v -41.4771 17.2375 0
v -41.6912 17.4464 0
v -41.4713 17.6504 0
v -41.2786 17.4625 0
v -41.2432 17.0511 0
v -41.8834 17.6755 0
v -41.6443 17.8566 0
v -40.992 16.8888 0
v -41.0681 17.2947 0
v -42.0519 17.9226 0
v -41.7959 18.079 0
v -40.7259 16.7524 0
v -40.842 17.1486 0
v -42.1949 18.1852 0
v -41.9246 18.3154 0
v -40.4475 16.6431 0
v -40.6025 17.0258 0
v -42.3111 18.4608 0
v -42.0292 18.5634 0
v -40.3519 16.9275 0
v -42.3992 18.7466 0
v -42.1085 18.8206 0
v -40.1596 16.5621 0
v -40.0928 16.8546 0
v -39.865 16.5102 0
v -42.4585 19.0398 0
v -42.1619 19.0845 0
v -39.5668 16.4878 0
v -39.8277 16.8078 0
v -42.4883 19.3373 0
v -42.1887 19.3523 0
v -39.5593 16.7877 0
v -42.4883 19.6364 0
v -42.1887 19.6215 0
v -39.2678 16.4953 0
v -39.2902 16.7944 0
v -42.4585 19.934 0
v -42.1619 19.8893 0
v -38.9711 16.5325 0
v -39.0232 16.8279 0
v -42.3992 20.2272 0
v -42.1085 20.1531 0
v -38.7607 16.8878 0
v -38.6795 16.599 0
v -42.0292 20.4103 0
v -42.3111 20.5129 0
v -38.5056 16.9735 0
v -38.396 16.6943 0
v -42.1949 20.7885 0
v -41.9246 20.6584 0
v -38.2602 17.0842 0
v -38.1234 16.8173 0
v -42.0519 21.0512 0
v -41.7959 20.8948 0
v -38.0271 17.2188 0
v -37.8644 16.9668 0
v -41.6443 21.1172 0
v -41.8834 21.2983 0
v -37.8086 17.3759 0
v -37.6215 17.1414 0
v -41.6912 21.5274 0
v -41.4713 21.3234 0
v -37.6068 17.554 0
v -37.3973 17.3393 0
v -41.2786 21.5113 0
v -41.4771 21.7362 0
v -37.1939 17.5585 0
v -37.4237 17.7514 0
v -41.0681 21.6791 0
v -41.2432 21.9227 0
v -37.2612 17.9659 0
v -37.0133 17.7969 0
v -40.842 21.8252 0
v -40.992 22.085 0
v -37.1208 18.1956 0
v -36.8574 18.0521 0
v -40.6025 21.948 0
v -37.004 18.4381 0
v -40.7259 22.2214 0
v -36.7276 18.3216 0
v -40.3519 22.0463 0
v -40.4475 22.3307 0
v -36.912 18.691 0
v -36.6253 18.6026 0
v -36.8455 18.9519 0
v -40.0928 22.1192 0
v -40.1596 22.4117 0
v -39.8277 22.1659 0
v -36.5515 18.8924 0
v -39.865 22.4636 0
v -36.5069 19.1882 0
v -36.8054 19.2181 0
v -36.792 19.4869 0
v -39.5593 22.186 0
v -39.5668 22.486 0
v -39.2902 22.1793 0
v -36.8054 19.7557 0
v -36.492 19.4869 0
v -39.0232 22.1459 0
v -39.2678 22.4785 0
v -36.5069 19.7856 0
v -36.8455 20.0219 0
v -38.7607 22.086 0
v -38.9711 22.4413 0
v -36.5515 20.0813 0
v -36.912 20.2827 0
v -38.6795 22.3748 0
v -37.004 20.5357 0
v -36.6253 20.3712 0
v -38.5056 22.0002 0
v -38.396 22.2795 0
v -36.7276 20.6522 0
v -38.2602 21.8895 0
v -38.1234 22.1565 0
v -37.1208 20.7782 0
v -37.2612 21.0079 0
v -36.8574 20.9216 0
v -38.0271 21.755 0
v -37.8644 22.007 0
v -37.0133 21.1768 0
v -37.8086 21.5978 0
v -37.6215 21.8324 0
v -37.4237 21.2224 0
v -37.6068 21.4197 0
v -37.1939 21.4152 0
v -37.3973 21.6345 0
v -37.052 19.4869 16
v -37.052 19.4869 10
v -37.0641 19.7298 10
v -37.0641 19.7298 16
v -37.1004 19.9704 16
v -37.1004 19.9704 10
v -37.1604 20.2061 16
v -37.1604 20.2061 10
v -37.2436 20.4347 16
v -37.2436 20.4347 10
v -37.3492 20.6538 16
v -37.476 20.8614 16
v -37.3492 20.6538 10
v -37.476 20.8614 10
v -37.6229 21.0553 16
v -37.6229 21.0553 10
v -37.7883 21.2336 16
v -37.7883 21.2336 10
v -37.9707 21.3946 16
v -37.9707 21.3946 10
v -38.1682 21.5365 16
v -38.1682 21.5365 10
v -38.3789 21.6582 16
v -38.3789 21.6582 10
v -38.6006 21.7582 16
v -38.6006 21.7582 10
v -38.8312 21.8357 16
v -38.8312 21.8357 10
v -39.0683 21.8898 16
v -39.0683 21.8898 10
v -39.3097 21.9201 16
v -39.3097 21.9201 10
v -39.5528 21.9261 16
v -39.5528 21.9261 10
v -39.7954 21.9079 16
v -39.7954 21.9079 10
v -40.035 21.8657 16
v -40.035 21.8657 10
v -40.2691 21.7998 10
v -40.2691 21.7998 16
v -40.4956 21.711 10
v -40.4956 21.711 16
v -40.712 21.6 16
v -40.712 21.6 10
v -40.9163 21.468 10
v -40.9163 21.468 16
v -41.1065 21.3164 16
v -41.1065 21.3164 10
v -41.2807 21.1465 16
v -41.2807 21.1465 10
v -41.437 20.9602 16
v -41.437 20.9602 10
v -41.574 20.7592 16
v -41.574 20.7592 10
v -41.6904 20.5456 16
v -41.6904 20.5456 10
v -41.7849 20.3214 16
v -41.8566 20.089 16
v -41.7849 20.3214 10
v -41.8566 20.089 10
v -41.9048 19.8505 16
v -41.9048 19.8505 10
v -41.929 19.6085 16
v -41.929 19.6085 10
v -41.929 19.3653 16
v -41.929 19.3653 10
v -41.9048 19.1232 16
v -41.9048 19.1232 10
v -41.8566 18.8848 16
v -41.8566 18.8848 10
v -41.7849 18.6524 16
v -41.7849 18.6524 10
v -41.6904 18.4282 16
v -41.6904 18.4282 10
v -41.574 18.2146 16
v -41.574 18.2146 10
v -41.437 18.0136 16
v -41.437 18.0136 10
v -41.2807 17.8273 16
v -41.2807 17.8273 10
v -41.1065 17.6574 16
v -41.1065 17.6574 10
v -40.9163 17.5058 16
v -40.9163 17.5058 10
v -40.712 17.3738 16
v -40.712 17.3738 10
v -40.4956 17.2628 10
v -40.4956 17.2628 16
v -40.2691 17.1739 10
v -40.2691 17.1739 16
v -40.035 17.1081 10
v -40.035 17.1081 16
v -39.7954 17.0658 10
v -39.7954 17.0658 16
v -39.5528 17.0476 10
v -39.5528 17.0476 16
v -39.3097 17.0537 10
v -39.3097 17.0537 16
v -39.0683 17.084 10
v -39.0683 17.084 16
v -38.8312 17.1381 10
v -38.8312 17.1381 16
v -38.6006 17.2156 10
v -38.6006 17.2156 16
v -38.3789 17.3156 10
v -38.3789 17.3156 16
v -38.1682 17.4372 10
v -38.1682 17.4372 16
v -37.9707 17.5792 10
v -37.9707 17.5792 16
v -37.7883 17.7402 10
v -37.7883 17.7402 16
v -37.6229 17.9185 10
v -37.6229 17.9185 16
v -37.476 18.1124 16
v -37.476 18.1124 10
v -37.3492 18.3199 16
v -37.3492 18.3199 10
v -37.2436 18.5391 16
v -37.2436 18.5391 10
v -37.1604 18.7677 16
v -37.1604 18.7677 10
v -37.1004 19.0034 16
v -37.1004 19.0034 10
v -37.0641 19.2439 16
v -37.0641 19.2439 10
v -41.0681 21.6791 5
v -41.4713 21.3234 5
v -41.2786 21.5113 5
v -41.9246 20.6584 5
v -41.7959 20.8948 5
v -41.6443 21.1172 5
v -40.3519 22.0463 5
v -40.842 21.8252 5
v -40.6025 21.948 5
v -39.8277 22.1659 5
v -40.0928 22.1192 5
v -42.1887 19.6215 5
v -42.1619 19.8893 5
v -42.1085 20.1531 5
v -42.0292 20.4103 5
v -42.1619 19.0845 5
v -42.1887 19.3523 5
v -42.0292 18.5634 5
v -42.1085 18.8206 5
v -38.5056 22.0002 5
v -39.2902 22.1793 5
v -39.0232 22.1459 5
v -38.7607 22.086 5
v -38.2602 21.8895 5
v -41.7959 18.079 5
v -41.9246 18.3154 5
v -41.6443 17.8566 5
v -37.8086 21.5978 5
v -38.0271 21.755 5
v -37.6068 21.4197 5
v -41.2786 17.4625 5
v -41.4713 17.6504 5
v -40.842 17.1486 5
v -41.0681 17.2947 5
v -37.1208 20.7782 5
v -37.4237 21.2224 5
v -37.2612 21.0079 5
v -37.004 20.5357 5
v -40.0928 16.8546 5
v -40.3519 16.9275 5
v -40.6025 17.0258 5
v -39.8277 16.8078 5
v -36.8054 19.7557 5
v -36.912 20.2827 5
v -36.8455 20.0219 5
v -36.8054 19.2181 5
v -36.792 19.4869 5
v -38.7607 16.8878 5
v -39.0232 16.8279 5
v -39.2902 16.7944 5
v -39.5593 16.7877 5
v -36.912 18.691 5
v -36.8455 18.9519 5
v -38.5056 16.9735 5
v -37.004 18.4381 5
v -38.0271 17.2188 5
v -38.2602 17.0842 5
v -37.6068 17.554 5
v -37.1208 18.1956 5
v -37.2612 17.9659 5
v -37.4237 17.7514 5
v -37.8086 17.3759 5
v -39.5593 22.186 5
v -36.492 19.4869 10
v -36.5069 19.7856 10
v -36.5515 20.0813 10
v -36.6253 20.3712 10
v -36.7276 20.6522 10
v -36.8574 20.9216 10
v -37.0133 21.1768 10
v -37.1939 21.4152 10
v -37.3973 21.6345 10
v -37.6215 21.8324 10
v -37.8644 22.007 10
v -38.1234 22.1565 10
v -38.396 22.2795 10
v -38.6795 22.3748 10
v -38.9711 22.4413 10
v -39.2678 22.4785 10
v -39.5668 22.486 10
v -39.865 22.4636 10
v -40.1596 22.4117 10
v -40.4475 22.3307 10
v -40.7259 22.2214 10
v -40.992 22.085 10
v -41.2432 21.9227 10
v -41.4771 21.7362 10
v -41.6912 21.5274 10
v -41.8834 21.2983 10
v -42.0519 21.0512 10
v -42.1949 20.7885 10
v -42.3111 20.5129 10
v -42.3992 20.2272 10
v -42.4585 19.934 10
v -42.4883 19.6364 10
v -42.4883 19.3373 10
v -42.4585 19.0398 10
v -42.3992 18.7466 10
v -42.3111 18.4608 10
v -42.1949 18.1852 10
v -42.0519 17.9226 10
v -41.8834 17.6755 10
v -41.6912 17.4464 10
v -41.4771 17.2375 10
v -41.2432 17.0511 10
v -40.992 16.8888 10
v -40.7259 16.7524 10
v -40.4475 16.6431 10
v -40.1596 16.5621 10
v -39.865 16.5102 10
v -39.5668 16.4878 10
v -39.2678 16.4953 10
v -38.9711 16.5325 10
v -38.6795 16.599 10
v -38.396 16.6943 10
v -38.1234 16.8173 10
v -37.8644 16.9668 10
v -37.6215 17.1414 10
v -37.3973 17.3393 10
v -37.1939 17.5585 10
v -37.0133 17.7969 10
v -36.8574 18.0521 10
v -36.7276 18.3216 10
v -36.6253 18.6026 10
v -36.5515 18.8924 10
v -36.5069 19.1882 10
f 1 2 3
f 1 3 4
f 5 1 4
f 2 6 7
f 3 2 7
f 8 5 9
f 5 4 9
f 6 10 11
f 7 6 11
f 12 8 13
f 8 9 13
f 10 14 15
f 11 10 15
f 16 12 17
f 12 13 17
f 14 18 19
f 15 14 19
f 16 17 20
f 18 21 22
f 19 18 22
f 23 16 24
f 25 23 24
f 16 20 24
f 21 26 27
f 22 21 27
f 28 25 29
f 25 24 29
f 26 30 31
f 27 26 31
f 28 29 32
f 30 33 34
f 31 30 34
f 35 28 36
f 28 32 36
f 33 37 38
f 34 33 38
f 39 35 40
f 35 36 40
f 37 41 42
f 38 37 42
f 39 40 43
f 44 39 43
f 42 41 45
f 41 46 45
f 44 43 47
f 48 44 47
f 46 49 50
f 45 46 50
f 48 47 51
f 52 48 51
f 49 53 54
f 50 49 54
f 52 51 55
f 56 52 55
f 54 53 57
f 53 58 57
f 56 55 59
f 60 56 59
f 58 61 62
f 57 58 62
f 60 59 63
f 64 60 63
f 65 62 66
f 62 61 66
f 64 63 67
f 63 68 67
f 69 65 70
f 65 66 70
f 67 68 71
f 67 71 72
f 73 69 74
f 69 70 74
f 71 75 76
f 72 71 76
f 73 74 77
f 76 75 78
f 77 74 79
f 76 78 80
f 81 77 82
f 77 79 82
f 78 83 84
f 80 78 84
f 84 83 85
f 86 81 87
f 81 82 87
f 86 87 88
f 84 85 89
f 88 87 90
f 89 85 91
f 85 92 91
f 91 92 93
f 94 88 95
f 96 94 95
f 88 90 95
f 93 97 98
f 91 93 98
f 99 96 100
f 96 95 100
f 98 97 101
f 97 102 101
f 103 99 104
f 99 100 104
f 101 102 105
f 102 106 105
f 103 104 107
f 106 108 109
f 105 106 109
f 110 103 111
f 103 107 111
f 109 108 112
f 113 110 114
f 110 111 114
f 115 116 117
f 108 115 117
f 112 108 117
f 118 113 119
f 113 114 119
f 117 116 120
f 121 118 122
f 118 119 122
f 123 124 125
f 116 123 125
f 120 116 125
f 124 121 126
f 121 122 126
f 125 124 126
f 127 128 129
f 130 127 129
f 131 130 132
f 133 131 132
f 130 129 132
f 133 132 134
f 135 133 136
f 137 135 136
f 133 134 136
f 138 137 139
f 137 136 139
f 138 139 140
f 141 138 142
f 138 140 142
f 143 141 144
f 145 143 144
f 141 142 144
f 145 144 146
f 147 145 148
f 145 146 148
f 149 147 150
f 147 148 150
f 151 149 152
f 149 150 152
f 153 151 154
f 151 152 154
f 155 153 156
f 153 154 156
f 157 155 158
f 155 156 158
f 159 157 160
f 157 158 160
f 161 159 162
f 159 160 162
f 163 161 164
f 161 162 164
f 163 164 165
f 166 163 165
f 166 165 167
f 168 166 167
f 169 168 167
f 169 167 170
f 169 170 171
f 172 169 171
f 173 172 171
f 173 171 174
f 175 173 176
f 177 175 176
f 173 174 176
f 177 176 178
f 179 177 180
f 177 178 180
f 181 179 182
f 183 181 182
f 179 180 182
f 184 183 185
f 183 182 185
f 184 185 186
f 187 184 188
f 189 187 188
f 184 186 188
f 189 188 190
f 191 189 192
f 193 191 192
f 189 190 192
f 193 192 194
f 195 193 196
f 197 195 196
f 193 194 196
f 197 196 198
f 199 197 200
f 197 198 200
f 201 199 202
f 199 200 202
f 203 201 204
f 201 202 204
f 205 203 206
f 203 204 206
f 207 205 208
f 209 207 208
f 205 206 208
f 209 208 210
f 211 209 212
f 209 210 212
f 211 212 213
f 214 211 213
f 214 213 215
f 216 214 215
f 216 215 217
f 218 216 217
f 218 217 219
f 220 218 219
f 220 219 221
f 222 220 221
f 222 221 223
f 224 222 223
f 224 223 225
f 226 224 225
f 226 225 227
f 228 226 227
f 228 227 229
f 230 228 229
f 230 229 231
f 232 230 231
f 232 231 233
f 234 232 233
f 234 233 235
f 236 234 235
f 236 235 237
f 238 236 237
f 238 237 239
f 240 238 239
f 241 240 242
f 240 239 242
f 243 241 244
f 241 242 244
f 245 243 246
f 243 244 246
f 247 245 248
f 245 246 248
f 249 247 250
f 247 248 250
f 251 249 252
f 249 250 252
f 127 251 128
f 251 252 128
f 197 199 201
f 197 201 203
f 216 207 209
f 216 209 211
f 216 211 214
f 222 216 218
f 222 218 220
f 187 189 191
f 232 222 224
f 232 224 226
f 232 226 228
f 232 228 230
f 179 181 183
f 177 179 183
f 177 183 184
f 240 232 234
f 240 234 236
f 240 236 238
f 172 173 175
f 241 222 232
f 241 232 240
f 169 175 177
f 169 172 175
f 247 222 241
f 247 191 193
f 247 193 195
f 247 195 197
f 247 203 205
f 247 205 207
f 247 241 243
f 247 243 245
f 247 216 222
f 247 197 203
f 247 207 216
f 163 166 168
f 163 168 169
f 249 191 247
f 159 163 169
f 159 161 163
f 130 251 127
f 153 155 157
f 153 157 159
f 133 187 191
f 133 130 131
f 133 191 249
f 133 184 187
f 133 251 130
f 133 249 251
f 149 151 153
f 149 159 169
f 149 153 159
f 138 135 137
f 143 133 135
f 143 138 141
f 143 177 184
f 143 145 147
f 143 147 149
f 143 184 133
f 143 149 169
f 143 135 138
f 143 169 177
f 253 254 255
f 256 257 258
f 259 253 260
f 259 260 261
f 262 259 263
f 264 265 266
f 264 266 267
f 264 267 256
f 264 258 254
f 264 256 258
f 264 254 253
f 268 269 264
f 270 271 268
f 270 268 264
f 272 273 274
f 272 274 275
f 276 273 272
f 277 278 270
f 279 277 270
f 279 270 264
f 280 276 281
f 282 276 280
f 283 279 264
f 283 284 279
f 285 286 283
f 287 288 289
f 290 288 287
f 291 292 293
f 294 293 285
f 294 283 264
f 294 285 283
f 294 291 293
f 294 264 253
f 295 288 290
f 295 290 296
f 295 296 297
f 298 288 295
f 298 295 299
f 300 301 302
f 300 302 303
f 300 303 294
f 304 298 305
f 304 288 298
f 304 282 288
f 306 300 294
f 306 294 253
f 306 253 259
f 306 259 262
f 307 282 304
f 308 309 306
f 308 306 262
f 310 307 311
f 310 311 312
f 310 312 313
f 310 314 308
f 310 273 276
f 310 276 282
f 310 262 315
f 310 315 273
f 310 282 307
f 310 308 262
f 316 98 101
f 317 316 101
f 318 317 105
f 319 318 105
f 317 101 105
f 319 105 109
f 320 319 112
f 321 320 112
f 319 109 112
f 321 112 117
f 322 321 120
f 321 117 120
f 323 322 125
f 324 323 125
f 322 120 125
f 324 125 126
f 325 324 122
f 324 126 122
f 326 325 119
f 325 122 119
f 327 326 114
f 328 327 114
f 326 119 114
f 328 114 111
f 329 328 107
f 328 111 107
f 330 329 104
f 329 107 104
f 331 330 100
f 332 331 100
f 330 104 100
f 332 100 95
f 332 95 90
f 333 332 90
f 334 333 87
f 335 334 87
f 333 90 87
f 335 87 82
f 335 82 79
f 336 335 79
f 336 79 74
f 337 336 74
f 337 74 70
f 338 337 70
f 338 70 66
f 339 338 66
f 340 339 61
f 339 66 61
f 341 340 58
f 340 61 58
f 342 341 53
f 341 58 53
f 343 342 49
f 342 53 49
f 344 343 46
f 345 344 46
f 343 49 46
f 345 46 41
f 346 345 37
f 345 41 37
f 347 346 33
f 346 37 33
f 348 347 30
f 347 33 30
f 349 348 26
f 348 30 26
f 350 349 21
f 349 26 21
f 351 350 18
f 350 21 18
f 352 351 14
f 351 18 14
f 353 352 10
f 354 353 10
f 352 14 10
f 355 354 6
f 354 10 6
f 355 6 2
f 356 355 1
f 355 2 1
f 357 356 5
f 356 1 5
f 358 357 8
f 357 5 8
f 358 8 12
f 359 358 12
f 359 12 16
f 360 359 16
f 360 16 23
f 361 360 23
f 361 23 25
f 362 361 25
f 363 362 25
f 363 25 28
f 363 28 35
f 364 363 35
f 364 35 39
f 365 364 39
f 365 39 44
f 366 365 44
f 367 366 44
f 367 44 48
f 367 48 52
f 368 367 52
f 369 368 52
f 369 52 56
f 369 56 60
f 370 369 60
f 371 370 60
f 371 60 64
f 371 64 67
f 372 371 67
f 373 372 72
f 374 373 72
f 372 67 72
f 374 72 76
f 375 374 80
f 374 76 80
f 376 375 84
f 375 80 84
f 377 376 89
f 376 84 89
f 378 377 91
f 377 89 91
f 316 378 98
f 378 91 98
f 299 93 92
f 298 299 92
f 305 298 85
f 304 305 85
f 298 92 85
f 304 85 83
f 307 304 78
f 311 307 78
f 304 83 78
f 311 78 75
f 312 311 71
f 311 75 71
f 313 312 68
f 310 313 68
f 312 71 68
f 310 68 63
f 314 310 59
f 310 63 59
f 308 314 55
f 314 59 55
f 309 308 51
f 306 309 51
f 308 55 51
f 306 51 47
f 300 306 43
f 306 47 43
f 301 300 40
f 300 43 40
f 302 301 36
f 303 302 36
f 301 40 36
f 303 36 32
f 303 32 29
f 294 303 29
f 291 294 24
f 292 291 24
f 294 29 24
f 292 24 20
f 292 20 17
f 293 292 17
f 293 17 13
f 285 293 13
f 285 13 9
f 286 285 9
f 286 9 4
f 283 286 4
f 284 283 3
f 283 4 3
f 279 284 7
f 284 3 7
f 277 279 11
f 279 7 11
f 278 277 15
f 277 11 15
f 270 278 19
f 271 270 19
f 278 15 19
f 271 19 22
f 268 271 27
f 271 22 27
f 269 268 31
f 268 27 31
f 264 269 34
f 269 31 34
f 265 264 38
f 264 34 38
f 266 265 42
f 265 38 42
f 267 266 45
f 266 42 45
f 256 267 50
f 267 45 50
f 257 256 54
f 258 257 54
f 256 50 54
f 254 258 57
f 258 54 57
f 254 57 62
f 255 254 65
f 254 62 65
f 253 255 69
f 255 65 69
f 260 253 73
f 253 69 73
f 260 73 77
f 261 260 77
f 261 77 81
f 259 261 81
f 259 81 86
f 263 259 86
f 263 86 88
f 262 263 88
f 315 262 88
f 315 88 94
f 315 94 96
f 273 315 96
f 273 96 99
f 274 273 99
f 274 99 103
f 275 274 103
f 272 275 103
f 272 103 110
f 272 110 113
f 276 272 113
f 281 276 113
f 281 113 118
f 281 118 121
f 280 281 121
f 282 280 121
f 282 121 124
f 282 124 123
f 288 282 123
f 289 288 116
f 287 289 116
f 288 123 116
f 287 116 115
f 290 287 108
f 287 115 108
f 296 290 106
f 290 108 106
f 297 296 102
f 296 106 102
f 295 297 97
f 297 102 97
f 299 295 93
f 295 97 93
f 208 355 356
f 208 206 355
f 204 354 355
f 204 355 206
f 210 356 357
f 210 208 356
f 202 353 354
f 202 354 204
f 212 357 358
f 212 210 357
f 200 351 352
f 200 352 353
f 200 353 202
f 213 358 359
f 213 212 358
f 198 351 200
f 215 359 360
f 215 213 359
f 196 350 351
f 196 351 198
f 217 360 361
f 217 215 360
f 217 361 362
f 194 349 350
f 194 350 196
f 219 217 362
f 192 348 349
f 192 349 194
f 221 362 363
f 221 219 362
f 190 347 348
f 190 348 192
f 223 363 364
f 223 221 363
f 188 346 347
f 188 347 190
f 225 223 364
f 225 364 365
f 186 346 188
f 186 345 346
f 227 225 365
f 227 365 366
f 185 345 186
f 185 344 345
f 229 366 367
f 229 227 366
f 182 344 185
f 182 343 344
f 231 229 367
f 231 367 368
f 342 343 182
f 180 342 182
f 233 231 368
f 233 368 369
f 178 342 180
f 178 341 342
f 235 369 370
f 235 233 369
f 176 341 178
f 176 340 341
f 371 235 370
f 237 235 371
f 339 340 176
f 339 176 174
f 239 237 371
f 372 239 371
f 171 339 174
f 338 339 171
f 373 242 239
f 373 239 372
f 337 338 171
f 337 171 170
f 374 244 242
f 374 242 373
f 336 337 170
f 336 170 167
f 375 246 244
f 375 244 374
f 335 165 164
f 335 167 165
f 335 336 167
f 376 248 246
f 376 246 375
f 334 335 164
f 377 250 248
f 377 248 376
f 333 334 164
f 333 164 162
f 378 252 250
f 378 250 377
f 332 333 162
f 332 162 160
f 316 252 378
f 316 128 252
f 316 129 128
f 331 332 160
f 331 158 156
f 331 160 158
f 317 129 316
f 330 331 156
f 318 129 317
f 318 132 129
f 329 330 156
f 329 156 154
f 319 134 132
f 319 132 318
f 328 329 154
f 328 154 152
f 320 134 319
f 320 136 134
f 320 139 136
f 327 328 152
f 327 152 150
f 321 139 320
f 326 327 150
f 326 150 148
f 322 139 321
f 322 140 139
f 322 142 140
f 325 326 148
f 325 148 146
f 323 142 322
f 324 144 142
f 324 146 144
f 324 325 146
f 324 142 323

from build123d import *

# Parameters (mm, degrees)
F0_R     = 3
F1_DEPTH = 10
F2_R     = 2.44
F3_DEPTH = 6
F4_R     = 2.7
F5_DEPTH = 5


with BuildPart() as f1:
    # F0 (on Top) → F1 (new body)
    with BuildSketch(Plane.XY):
        with Locations((-39.492015, 19.486886)):
            Circle(F0_R)
    extrude(amount=F1_DEPTH)

    # F2 (on face) → F3 (join)
    with BuildSketch(Plane.XY.offset(10)):
        with Locations((-39.492015, 19.486886)):
            Circle(F2_R)
    extrude(amount=F3_DEPTH)

    # F4 (on face) → F5 (cut)
    with BuildSketch(Plane(origin=(0, 0, 0), x_dir=(1, 0, 0), z_dir=(0, 0, -1))):
        with Locations((-39.492015, -19.486886)):
            Circle(F4_R)
    extrude(amount=-F5_DEPTH, mode=Mode.SUBTRACT)


solid = f1.part
